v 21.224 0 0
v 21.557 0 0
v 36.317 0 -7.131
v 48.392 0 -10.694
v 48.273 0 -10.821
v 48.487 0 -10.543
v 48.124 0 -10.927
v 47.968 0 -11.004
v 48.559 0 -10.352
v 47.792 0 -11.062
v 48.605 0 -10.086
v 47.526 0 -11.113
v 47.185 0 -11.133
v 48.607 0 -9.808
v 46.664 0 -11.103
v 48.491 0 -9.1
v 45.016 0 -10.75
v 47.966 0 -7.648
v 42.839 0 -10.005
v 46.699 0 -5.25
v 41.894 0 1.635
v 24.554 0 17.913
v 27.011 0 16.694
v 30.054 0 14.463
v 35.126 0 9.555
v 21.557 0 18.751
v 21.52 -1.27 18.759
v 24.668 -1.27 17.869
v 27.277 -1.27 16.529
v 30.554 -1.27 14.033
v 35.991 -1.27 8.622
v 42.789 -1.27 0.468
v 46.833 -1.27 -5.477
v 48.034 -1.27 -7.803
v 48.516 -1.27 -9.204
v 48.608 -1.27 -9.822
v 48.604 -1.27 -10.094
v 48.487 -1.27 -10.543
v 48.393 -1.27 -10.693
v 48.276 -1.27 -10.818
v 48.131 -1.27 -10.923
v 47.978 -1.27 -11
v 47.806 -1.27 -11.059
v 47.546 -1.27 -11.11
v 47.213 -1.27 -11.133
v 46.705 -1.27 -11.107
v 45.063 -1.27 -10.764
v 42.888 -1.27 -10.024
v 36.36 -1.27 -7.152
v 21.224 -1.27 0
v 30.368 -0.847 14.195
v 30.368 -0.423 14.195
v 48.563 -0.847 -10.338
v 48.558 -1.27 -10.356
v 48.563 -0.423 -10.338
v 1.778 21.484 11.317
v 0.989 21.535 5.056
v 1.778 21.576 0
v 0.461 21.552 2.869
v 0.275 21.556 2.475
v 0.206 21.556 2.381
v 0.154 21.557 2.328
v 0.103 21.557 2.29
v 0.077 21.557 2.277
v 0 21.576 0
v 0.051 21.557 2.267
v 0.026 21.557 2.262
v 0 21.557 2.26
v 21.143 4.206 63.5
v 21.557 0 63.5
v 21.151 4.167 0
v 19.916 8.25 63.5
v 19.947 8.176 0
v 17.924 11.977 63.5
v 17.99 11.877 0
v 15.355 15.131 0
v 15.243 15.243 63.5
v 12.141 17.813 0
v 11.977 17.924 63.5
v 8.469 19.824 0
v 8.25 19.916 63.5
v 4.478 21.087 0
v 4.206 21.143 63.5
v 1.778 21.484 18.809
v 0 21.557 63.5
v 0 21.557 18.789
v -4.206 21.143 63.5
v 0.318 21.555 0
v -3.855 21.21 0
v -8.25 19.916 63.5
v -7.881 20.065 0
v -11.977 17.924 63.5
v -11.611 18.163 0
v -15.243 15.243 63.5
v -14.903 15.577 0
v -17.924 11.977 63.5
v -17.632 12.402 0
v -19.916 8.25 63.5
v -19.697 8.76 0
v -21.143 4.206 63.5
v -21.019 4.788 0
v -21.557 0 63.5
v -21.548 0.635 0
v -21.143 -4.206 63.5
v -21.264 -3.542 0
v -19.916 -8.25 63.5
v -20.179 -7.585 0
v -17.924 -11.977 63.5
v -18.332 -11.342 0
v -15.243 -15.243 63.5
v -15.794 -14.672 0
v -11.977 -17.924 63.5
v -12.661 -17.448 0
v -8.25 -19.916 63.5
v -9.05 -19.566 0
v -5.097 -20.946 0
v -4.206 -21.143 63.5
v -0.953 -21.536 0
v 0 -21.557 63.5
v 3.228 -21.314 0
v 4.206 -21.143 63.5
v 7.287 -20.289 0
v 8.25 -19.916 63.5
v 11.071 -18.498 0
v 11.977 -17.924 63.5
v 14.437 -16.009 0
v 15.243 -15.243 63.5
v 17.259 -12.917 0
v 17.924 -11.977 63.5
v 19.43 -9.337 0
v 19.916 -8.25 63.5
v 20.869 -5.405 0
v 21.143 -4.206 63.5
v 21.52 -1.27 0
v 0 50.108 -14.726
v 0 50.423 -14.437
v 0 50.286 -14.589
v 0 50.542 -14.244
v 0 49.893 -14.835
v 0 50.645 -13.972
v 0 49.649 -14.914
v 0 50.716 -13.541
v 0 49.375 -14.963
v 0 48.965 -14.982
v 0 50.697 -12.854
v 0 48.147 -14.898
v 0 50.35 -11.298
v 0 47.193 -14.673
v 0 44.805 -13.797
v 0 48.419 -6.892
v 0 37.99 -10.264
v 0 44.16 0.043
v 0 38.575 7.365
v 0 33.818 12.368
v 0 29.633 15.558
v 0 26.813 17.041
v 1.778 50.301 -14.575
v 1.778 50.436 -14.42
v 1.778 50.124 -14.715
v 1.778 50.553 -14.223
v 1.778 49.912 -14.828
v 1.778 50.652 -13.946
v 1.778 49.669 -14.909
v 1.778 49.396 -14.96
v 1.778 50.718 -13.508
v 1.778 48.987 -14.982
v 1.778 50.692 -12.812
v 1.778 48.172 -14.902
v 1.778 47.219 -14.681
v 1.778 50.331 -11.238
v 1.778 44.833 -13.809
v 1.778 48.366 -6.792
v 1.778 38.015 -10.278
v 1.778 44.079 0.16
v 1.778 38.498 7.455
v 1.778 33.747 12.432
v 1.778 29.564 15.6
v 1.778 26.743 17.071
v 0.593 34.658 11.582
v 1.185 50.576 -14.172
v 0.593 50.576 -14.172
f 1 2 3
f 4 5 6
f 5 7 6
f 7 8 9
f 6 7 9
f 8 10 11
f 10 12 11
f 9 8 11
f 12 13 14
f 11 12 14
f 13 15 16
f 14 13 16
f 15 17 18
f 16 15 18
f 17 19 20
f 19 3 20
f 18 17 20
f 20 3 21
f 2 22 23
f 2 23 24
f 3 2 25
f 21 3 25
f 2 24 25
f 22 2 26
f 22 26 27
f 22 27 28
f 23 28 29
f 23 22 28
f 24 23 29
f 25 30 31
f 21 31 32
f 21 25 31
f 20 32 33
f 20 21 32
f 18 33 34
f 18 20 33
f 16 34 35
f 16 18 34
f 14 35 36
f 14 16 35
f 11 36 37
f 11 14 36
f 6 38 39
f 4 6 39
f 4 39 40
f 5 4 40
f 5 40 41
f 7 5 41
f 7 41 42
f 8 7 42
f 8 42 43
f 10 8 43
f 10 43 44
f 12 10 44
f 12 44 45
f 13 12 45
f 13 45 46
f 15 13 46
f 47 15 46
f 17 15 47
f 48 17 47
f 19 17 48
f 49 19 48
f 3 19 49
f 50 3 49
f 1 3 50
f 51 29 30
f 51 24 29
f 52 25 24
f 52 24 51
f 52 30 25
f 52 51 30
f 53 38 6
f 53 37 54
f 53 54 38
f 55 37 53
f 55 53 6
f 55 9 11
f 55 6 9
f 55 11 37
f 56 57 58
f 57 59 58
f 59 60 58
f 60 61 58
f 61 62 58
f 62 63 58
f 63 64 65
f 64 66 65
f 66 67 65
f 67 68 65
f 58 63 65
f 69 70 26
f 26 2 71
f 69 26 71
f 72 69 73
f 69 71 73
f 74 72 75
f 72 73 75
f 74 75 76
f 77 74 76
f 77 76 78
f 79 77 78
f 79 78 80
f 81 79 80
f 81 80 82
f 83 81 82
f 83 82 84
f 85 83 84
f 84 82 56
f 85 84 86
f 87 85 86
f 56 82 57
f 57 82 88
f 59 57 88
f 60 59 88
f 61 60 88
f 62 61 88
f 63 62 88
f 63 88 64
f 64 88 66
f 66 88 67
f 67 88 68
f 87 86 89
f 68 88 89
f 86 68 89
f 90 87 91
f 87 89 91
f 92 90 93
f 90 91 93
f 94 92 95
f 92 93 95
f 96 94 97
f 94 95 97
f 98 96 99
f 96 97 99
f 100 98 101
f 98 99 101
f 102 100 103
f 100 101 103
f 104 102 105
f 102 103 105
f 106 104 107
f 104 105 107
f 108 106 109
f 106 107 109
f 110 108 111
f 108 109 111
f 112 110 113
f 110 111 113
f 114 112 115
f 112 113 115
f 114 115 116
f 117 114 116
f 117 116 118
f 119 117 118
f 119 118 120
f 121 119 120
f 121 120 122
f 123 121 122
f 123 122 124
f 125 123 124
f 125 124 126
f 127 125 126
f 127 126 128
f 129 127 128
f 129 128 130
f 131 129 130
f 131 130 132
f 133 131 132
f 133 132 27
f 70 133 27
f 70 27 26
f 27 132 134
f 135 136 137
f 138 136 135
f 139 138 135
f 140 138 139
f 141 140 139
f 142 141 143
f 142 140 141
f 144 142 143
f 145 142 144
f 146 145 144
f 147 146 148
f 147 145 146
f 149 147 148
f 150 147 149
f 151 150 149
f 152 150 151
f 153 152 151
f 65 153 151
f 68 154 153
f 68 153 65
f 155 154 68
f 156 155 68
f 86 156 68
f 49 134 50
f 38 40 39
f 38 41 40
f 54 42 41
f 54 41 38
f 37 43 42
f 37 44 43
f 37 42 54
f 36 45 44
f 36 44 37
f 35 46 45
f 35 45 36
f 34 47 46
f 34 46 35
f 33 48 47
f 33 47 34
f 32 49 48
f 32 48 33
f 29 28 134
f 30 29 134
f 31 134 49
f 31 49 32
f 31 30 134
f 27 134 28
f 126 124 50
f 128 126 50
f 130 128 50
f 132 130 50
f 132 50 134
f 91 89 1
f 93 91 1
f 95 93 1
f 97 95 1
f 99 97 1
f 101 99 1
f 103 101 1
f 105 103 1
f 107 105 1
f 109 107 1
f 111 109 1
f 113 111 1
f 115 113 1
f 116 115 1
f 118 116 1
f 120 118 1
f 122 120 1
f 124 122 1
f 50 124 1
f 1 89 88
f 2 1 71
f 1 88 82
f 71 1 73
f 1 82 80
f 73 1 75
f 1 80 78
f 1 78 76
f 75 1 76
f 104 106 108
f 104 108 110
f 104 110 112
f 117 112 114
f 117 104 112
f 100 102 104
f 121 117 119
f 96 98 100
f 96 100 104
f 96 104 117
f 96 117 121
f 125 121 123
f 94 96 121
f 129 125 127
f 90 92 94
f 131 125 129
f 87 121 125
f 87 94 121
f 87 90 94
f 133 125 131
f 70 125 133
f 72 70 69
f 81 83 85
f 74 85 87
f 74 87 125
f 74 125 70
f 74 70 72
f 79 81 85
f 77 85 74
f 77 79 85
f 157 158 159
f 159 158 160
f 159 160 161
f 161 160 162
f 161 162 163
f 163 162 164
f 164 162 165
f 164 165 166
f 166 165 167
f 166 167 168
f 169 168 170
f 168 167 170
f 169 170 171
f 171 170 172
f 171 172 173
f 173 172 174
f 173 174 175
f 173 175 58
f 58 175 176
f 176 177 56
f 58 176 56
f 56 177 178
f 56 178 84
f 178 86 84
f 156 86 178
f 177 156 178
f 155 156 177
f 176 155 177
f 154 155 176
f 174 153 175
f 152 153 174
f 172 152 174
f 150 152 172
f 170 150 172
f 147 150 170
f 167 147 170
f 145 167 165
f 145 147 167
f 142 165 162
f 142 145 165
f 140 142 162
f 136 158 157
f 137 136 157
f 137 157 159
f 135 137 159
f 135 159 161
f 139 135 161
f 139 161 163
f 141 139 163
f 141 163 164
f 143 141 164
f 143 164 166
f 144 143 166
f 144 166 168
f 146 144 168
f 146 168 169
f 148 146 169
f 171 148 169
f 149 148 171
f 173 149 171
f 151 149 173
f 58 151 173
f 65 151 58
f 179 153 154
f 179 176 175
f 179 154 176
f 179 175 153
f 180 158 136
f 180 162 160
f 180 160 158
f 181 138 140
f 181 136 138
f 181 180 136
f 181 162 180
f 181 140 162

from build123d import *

# Parameters (mm, degrees)
F0_R     = 21.5573937043
F1_DEPTH = 63.5
F3_DEPTH = 1.778
F5_DEPTH = 1.27


with BuildPart() as f1:
    # F0 (on Top) → F1 (new body)
    with BuildSketch(Plane.XY):
        Circle(F0_R)
    extrude(amount=F1_DEPTH)

    # F2 (on Right) → F3 (join)
    with BuildSketch(Plane.YZ):
        with BuildLine():
            add(Edge.make_bspline(
                [(21.4230585843, 18.8257303089), (25.4152571812, 17.7337542467), (35.0627733159, 15.0948933727), (62.3459313723, -26.3349238901), (35.309978925, -8.8714455783), (21.5757172555, 0)],
                knots=[0, 0, 0, 0, 0.257781652, 0.6229531389, 1, 1, 1, 1], degree=3))
            Line((21.4230585843, 18.8257303089), (21.5757172555, 0))
        make_face()
    extrude(amount=F3_DEPTH)

    # F4 (on Front) → F5 (join)
    with BuildSketch(Plane.XZ):
        with BuildLine():
            Line((21.2236842012, 18.8214), (21.2236842012, 0))
            add(Edge.make_bspline(
                [(21.2236842012, 18.8214), (23.8559514528, 18.2657870203), (30.4596483204, 16.8021538854), (61.2280877119, -21.6449576492), (34.4408537462, -5.8542687668), (21.2236842012, 0)],
                knots=[0, 0, 0, 0, 0.2264847707, 0.6174984663, 1, 1, 1, 1], degree=3))
        make_face()
    extrude(amount=F5_DEPTH)


solid = f1.part
